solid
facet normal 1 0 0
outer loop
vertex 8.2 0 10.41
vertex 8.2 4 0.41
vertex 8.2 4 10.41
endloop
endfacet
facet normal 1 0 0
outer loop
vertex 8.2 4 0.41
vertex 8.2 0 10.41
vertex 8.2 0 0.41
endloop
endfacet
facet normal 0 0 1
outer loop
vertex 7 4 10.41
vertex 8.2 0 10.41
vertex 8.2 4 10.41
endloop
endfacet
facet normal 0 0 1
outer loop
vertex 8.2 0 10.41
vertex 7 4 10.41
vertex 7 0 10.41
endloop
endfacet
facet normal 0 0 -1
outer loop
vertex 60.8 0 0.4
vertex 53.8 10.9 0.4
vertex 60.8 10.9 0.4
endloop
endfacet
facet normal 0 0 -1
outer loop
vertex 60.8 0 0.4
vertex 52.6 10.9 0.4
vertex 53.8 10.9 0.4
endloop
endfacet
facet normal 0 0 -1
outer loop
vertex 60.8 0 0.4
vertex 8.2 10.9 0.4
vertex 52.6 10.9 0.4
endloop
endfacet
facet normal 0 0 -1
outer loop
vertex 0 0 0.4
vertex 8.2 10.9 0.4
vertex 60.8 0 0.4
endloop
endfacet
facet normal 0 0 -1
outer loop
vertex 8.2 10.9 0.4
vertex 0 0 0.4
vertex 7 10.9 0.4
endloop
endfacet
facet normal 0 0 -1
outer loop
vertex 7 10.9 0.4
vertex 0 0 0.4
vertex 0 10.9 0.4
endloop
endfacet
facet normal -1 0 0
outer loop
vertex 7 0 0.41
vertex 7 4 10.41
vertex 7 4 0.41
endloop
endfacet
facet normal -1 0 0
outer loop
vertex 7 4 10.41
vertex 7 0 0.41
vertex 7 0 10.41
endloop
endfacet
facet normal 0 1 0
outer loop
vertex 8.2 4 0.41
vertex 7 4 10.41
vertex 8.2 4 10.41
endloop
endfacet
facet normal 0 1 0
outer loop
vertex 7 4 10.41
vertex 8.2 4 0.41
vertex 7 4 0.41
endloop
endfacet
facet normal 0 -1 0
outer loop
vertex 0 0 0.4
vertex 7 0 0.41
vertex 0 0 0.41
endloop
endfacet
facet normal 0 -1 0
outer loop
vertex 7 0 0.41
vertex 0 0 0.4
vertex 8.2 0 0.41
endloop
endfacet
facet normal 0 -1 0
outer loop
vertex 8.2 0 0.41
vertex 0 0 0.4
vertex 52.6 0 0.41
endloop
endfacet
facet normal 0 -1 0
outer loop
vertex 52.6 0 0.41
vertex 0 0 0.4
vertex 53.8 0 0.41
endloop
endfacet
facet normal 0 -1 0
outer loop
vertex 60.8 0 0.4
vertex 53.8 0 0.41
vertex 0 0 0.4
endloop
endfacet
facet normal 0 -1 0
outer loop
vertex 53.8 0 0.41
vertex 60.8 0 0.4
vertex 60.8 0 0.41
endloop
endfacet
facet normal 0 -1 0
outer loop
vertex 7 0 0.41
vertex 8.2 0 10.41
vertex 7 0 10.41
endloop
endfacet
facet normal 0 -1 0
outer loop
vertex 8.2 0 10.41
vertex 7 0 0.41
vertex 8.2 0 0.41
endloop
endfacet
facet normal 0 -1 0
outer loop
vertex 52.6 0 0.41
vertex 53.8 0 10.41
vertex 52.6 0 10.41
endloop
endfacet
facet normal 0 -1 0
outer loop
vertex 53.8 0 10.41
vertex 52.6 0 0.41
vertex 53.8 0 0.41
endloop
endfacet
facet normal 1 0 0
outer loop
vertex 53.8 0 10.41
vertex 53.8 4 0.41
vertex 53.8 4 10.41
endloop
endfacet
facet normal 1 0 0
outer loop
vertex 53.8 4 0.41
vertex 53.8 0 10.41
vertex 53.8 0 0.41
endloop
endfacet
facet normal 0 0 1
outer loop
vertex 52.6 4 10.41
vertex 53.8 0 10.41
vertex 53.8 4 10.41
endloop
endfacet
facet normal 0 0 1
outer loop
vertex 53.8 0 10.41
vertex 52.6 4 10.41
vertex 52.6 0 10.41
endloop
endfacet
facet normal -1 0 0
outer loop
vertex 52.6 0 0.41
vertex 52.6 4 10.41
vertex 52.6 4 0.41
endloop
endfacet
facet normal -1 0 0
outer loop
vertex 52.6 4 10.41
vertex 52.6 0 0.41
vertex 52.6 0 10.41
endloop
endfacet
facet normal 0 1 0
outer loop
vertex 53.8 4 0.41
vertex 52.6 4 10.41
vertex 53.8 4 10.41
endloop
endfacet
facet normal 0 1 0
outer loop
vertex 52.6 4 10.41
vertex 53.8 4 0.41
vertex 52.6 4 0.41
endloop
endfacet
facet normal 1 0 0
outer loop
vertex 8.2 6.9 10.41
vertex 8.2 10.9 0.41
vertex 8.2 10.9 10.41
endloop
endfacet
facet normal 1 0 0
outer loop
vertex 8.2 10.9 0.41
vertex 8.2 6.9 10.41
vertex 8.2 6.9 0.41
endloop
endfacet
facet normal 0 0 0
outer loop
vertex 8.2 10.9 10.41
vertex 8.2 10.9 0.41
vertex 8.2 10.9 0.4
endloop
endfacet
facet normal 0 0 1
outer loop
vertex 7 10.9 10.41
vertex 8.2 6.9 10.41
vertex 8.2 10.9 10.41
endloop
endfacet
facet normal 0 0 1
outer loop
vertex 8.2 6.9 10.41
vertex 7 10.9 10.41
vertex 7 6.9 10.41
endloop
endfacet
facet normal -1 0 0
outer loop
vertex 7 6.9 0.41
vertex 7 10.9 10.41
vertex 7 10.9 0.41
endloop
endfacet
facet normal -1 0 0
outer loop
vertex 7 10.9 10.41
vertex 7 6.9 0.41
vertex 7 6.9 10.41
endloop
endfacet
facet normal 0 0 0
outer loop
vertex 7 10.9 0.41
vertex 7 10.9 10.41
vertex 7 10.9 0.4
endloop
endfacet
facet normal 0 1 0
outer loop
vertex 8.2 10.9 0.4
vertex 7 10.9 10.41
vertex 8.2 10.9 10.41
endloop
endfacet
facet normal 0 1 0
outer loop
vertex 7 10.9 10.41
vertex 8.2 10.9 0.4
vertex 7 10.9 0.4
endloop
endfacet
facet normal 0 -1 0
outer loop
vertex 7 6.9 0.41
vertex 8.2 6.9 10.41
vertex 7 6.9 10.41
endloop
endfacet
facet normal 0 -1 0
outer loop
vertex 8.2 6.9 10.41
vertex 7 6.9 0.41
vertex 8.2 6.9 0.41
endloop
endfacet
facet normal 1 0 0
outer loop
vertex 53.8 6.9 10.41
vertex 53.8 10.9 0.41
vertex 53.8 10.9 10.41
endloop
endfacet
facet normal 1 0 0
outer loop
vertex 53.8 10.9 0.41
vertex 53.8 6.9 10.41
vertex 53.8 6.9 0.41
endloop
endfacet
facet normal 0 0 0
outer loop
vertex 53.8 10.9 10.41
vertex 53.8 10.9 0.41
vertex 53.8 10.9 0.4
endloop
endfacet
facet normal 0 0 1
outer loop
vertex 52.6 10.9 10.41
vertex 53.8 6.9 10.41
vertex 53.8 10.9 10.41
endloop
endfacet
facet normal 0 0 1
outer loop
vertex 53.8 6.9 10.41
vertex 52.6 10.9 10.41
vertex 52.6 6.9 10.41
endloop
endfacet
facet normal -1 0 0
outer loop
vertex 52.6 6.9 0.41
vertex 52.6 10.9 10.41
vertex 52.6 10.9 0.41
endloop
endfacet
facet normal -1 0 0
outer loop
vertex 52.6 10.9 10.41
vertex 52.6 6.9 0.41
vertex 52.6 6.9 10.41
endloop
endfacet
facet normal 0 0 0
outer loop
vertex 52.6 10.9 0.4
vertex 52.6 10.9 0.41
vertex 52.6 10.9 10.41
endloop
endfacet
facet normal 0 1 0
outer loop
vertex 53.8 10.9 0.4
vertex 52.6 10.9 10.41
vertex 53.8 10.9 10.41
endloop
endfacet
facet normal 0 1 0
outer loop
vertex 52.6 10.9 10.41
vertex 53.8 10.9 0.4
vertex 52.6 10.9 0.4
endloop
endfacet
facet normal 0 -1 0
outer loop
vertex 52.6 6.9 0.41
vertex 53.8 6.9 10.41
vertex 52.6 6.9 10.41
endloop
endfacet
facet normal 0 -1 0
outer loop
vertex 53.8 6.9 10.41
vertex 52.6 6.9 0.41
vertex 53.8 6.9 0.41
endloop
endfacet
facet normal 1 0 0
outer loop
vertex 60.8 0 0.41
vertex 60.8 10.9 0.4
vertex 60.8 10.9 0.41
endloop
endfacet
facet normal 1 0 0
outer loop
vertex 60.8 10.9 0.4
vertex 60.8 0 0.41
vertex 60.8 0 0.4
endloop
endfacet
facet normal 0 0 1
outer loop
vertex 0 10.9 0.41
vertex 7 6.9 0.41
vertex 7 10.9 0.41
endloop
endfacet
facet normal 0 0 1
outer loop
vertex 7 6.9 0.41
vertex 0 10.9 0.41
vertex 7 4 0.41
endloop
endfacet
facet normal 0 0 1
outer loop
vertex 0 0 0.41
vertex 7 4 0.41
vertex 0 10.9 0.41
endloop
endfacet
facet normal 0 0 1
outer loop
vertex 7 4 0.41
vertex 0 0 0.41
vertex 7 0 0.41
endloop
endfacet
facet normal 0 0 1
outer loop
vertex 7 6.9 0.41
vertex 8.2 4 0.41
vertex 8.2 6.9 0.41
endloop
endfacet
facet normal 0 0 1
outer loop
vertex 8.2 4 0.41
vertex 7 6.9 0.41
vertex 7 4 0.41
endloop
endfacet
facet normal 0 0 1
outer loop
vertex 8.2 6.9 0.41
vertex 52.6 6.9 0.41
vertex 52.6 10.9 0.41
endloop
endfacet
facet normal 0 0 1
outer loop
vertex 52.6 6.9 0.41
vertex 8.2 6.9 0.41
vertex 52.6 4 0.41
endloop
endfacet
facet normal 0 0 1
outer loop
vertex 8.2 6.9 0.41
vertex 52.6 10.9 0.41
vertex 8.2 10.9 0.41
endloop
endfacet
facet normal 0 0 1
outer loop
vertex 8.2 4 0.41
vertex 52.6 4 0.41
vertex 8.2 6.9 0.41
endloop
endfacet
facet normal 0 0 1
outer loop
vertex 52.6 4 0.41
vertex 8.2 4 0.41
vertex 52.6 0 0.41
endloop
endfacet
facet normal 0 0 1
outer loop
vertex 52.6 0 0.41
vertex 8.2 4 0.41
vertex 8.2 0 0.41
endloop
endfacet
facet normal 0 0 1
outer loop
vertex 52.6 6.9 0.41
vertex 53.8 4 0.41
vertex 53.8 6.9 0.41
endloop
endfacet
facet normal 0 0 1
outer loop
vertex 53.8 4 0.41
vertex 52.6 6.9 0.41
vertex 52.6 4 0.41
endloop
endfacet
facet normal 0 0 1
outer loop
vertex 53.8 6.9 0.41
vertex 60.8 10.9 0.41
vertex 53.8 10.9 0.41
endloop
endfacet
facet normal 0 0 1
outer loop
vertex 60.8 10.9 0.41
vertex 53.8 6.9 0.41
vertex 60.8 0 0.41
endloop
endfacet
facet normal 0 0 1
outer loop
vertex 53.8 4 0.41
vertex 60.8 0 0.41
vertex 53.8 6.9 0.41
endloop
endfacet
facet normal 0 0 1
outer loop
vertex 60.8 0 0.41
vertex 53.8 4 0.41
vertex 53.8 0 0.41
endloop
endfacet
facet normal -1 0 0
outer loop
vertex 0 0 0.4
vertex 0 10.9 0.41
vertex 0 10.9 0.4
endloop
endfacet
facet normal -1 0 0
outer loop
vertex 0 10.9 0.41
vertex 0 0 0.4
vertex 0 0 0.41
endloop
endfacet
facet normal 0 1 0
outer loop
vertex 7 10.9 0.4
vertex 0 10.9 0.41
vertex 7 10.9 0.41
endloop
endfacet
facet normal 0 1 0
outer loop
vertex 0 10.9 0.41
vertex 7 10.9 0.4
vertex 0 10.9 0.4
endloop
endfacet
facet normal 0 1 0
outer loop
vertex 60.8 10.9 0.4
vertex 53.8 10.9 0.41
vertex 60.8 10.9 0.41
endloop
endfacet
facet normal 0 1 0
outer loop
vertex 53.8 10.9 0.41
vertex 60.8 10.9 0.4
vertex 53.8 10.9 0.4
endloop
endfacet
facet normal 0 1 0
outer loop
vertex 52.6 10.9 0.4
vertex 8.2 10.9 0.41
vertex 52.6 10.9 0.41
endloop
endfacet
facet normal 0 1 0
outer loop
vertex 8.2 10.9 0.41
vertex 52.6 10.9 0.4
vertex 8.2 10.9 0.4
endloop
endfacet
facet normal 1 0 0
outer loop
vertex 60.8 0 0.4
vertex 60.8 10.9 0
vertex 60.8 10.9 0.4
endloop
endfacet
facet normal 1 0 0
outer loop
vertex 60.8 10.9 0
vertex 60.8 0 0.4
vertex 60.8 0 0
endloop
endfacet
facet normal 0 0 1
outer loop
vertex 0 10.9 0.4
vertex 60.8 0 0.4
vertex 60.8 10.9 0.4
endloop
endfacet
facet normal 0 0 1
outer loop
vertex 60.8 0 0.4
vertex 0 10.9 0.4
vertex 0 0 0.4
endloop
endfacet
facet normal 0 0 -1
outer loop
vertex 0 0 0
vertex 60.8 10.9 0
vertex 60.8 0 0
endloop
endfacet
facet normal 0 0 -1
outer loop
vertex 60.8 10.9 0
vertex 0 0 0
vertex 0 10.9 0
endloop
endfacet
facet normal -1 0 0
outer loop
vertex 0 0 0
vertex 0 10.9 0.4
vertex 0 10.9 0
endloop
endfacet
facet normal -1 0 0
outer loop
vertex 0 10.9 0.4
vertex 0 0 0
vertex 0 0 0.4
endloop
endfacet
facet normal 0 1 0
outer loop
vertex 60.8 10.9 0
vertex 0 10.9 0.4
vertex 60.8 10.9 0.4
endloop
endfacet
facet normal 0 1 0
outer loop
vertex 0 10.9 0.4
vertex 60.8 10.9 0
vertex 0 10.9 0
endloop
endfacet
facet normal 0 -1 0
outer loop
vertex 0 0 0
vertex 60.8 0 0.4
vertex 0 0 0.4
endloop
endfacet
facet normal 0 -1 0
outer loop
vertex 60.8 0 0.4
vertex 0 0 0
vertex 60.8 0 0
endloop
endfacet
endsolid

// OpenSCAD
// file: ../../Base/Rotation.scad
// Fischertechnik Box Foundation
// Geometry Helpers Rotation

include <PlacementOptions.scad>

// getRotatedSpace(space, rotation=NoRotation)
// Rotates the space dependent on the specified rotation

function getRotatedSpace(space, rotation=NoRotation) = [
    (rotation == Rotate90 || rotation == Rotate270) ? space.y : space.x,
    (rotation == Rotate90 || rotation == Rotate270) ? space.x : space.y
];

// Rotates the given space around the fixed left lower corner
// space = the space the children needs as width/depth list [width,depth]
// rotation = 0 Rotate0 degrees, 1 Rotate90 degrees, 2 Rotate180 degrees, 3 Rotate270 degrees (equivalent to -90)

module RotateFix(space, rotation=NoRotation) {
    dy = (rotation == Rotate0 || rotation == Rotate270) ? 0 :
        (rotation == Rotate90) ? space.x :
        space.y;
    dx = (rotation < Rotate180) ? 0 :
        (rotation == Rotate180) ? space.x :
        space.y;
    
    translate([dx, dy, 0])
        rotate([0, 0, rotations[rotation]])
            children();
}
// file: ../../Base/Alignment.scad
// Fischertechnik Box Foundation
// Geometry Helpers Alignment

include <PlacementOptions.scad>

// getAlignedX(elementWidth, spaceWidth, align=AlignRight, offset=0)
// Gets the aligned X offset of an element with the given
// width in the given space.
// elementWidth = The width of the element to positon
// spaceWidth = The space where the element should be aligned
// align = 0 AlignLeft, 1 AlignCenter, 2 AlignRight
// offset = an optional offset from the aligned position. When
// aligned left or centered, then positive values are in X direction.
// When aligned right then positive values are in negative X direction.

function getAlignedX(elementWidth, spaceWidth, align=AlignRight, offset=0) =
    (align == AlignLeft) ?
        offset :
        ((align == AlignCenter) ?
        (spaceWidth - elementWidth)/2 + offset :
        spaceWidth - offset - elementWidth);

// getAlignedY(elementDepth, spaceDepth, align=AlignTop, offset=0)
// Gets the aligned Y offset of an element with the given
// depth in the given space.
// elementDepth = The depth of the element to positon
// spaceDepth = The space where the element should be aligned
// align = 0 AlignBottom, 1 AlignCenter, 2 AlignTop
// offset = an optional offset from the aligned position. When
// aligned bottom or centered, then positive values are in Y direction.
// When aligned top then positive values are in negative Y direction.

function getAlignedY(elementDepth, spaceDepth, align=AlignTop, offset=0) =
    (align == AlignBottom) ?
        offset :
        ((align == AlignCenter) ?
        (spaceDepth - elementDepth)/2 + offset :
        spaceDepth - offset - elementDepth);
// file: ../../Base/Boxes.scad
// Fischertechnik Box Foundation
// Pre-designed Boxes

use <Constants.scad>

include <PlacementOptions.scad>

box190Width = 190;
box190Depth = 130;
box130Width = 130;
box130Depth = 95;

// Values are from an original ec3 box
topBottomDifference = 1.5;
outerHeight = 40;
baseThickness = 1.8;
innerHeight = outerHeight - baseThickness;
stackExcess = 5.7;
radius = 3.5;
wallThickness = 1.5;
tolerance = 0.2;

boxWallThickness = wallThickness;
boxBaseThickness = baseThickness;
boxWebWidth = 3.0;

// getBoxWallThickness()
// Gets the wall thickness of a Fischertechnik Box
function getBoxWallThickness() = boxWallThickness;

// getBoxUsageHeight(height = 38.2)
// Gets the usable height of a Fischertechnik box
// height = Outer height of the box from the bottom to the upper edge.
function getBoxUsageHeight(height = outerHeight) = height - baseThickness - stackExcess;

// getBoxInnerHeight()
// Gets the inner height of a Fischertechnik box, including the stack excess
function getBoxInnerHeight() = innerHeight;

// getBoxBaseThickness()
// Gets the thickness of the Fischertechnik box base.
function getBoxBaseThickness() = boxBaseThickness;

// getBoxWebWidth()
// Gets the width of a box web
function getBoxWebWidth() = boxWebWidth;

// getBox190Space()
// Gets the usable inner space of a Box 190 as an x/y-list
function getBox190Space() = [
    box190Width - 2*getBoxWallThickness() - topBottomDifference, 
    box190Depth - 2*getBoxWallThickness() - topBottomDifference ];

// RoundedCornerPlate(width, depth, height, radius)
// Creates a body plate with rounded corners for a box. Used
// also to create the complete box with the hull module.
// width = Width of the plate
// depth = depth of the plate 
// height = thickness of the plate
// radius = radius of the rounded corner
module RoundedCornerPlate(width, depth, height, radius) {
    translate([radius, radius])
    hull() {
        w = width-2*radius;
        d = depth-2*radius;
        cube([w, d, height]);
        cylinder(height, r=radius, $fn=getFragments());
        translate([w, 0])
            cylinder(height, r=radius, $fn=getFragments());
        translate([w, d])
            cylinder(height, r=radius, $fn=getFragments());
        translate([0, d])
            cylinder(height, r=radius, $fn=getFragments());
    }
}

// BoxBase(width, depth)
// Creates an empty stackable Fischertechnik compatible box
// width = Outer width of the box (190, 130, ...)
// depth = Outer depth of the box (130, 95, ...)

module BoxBase(width, depth, height=outerHeight) {    
    thinPlate = 0.01;

    innerHeight = height - baseThickness;    
    
    module Body(tolerance=tolerance) {
        hull() {
            // Bottom with tolerance to fit into the original boxes when stacked
            translate([-wallThickness+tolerance, -wallThickness+tolerance, -baseThickness])
                RoundedCornerPlate(width-topBottomDifference-2*tolerance, depth-topBottomDifference-2*tolerance, thinPlate, radius);
            
            // Top
            translate([-wallThickness-topBottomDifference/2, -wallThickness-topBottomDifference/2, innerHeight-thinPlate])
                RoundedCornerPlate(width, depth, thinPlate, radius);
         }
    }

    module Cutoff() {
        hull() {
            coWidth = width - 2*wallThickness;
            coDepth = depth - 2*wallThickness;
            
            // Bottom
            RoundedCornerPlate(coWidth-topBottomDifference, coDepth-topBottomDifference, thinPlate, radius);

            // Top
            translate([-topBottomDifference/2, -topBottomDifference/2, innerHeight+thinPlate]) 
                RoundedCornerPlate(coWidth, coDepth, thinPlate, radius);
        }
    }
    
    difference() {        
        Body();
        Cutoff();
        stackOffset = innerHeight - stackExcess;
        translate([0, 0, stackOffset + baseThickness])
            Body(tolerance=0);
    }
}

// Creates the Fischertechnik empty box 130x190 mm and places it at position 0,0
// 190x130 are the outer sizes, the inner space is slightly smaller. Use getBox190Space() to get the inner sizes.
// The box is positioned that the usable inner space is at the 0,0,0 position.

module Box190() {
    BoxBase(box190Width, box190Depth);
}

// Gets the usable inner space of a Box 130 as an x/y-list
function getBox130Space() = [
    box130Width - 2*getBoxWallThickness() - topBottomDifference, 
    box130Depth - 2*getBoxWallThickness() - topBottomDifference ];

// Creates the Fischertechnik empty box 95x130 mm and places it at position 0,0
// 190x130 are the outer sizes, the inner space is slightly smaller. Use getBox190Space() to get the inner sizes.
// The box is positioned that the usable inner space is at the 0,0,0 position.

module Box130() {
    BoxBase(box130Width, box130Depth);
}

// Creates a web at the specified box walls
// corner 0 = LowerLeft, 1 = UpperLeft, 2 = UpperRight, 3 = LowerRight
// side 0 = LeftOfCorner, 1 = RightOfCorner
// distance = Distance in mm from the corner
// boxSpace = inner width and depth of the box (default: Box 190)
// webWidth = length of the web (default is 3 mms)
// webThickness = thickness of the web (default is 1 mm)
// height = Height of the web (standard is getBoxUsageHeight())
// sink = How much of the web is sunk into the wall

module BoxWeb(
    corner, 
    side, 
    distance, 
    boxSpace=getBox190Space(), 
    webWidth=getBoxWebWidth(), 
    webThickness=1.0, 
    height=getBoxUsageHeight(),
    sink = getBoxWallThickness()/2) {
    width = (corner % 2 == 0) ? 
            (side == LeftOfCorner ? webWidth : webThickness) :
            (side == LeftOfCorner ? webThickness : webWidth);

    depth = (corner % 2 == 0) ? 
            (side == RightOfCorner ? webWidth : webThickness) :
            (side == RightOfCorner ? webThickness : webWidth);
    
    xDiff = corner == LowerLeft ? 
                (side == LeftOfCorner ? -sink : distance) :
            (corner == UpperLeft ?                
                (side == LeftOfCorner ? distance : -sink) :
            (corner == UpperRight ?
                (side == LeftOfCorner ? boxSpace.x-webWidth+sink : boxSpace.x-distance-webThickness) :
                (side == LeftOfCorner ? boxSpace.x-distance-webThickness: boxSpace.x-webWidth+sink)));

    yDiff = corner == LowerLeft ? 
                (side == RightOfCorner ? -sink : distance) :
            (corner == UpperLeft ?
                (side == RightOfCorner ? boxSpace.y-distance-webThickness : boxSpace.y-webWidth+sink) :
            (corner == UpperRight ?
                (side == RightOfCorner ? boxSpace.y-webWidth+sink : boxSpace.y-distance-webThickness) :
                (side == RightOfCorner ? distance : -sink)));
    
    translate([xDiff, yDiff, -getExcess()])
        cube([width, depth, height + 2*getExcess()]);
}
// file: ../../Base/PlacementOptions.scad
// Fischertechnik Box Foundation
// Placement Options

// Alignment
NoAlign = 0;
AlignLeft = 1;
AlignBottom = 2;
AlignCenter = 3;
AlignRight = 4;
AlignTop = 5;

// Element rotation degree steps
rotations = [0, -90, -180, -270];

// Rotation
NoRotation = 0;
Rotate0 = 0;
Rotate90 = 1;
Rotate180 = 2;
Rotate270 = 3;

// Docking (seen from above)
NoDock = -1;
DockLeft = 0;
DockTop = 1;
DockRight = 2;
DockCorner = 2;
DockBottom = 3;

// Web corners
LowerLeft = 0;
UpperLeft = 1;
UpperRight = 2;
LowerRight = 3;

// Web position relative to corner
LeftOfCorner = 0;
RightOfCorner = 1;

// Rails direction
Horizontal = true;
Vertical = false;
// file: ../../Base/Placement.scad
// Fischertechnik Box Foundation
// Geometry Helpers Placement

use <Constants.scad>
use <Alignment.scad>
use <Rotation.scad>
use <Boxes.scad>

include <PlacementOptions.scad>

// Place(x=0, y=0, elementSpace=[0,0], alignX=AlignLeft, alignY=AlignBottom, rotation=Rotate0, boxSpace=getBox190Space())
// Places the child at the specified position
// y = Y-Position. This is a relative position when an X aligment is specified.
// x = X-Position. This is a relative position when an Y aligment is specified.
// elementSpace = space of the element to be placed [x,y]
// alignX = -1=NoAlign, 0 AlignLeft, 1 AlignCenter, 3 AlignRight (elementSpace and boxSpace required!)
// alignY = -1=NoAlign, 2 AlignBottom, 1 AlignCenter, 4 AlignTop (elementSpace and boxSpace required!)
// rotation = 0 Rotate0 0 degrees, 1 Rotate90 90 degrees, 
// 2 Rotate180 180 degrees, 3 Rotate270 270 degrees (equivalent to -90)
// boxSpace = Inner space of the box where the placement occurs [x,y] - default is Box 190x130 inner space

module Place(x=0, y=0, elementSpace=[0,0], 
  alignX=AlignLeft, alignY=AlignBottom, 
  rotation=NoRotation, boxSpace=getBox190Space()) {

    module Position(x, y, space, rotation=Rotate0) {
        translate([x, y, 0])
            RotateFix(space, rotation)
                children();
    }

    space = getRotatedSpace(elementSpace, rotation);
    alignedX = getAlignedX(space.x, boxSpace.x, alignX, x);
    alignedY = getAlignedY(space.y, boxSpace.y, alignY, y);
    Position(alignedX, alignedY, elementSpace, rotation)
        children();
}

// Center(space=getBox130Space(), elementSpace=[0,0])
// space = Space where the children is centered. For cylinder use centered=true and no elementSpace.
// elementSpace = space of the element to be centered [x,y]

module Center(space=getBox190Space(), elementSpace=[0,0]) {
    Place(elementSpace=elementSpace, boxSpace=space, alignX=AlignCenter, alignY=AlignCenter)
        children();
}

// CenterHorizontal(width=0, y=0, offset=0, space=getBox130Space())
// width = Width of the element to be placed.
// y = Y position of the element
// offset = Offset from the center position (negative will be left of the center)
// space = Space where the element is placed

module CenterHorizontal(width=0, y=0, offset=0, space=getBox190Space()) {
    Place(x=offset, y=y, elementSpace=[width, 0], boxSpace=space, alignX=AlignCenter)
        children(0);
}

// CenterVertical(depth=0, x=0, offset=0, space=getBox130Space())
// depth = Depth of the element to be placed.
// x = X position of the element
// offset = Offset from the center position (negative will be down of the center)
// space = Space where the element is placed

module CenterVertical(depth=0, x=0, offset=0, space=getBox190Space()) {
    Place(x=x, y=offset, elementSpace=[0, depth], boxSpace=space, alignY=AlignCenter)
        children(0);
}

// getIsVertical(align)
// True if the specified alignment needs a vertical orientation for a divider (AlignRight, AlignLeft)

function getIsVertical(align) = (align == AlignRight || align == AlignLeft);

// getIsHorizontal(align)
// True if the specified alignment needs a horizontal orientation for a divider (AlignTop, AlignBottom)

function getIsHorizontal(align) = (align == AlignTop || align == AlignBottom);
// file: ../../Elements/AxisClip10.scad
// Fischertechnik Box Library
// Axis for clip 10
// 31023

use <../ModelBase/Simple.scad>
use <../Base/Constants.scad>

/* [Element Parameters] */
height = 23;
clipHeight = 10;

/* [Hidden] */
width = 12;
depth = 12;
upperDiameter = 3.6;

// getAxisClip10Space()
// Gets the space of a n axis for a clip 10 with spring ring (mot2)

function getAxisClip10Space() = [width, depth, height];

// AxisClip10(height, clipHeight)
// Axis for clip 10 with spring ring (mot2)
// height = Height of the complete axis (standard is 23, in mot3 its only 12)
// clipHeight = Height of the part for the clip (standard is 10, in mot3 its only 7)

module AxisClip10(height=height, clipHeight=clipHeight) {
    LeveledAxisWithSpace(height, height-clipHeight, getAxisClip10Space(), diameter=upperDiameter);
}

// Test
color("lightgray")
AxisClip10(height, clipHeight);
// file: ../../Base/Constants.scad
// Fischertechnik Box Foundation
// Constants

// Constant values necessary for multiple elements

// Base constants
dividerThickness = 1.2;
excess = 0.01;
fragments = 90;
tolerance = 0.8;

// Gets the thickness of a divider 
function getDividerThickness() = dividerThickness;

// Gets the excess that is used to merge walls into each other
function getExcess() = excess;

// Gets amount of fragments of a cylinder
function getFragments() = fragments;

// Gets the inner tolerance of a frame to each side
function getTolerance() = tolerance;


// Fischertechnik specific constants
axisDiameter = 4;
axisBottomDiameter = axisDiameter + 1;
axisTolerance = 0.2;
axisLockingLength = 8;

// Gets axis diameter of Fischertechnik axis
function getAxisDiameter() = axisDiameter;

// Gets axis diameter tolerance (subtracted for element axis)
function getAxisTolerance() = axisTolerance;

// Gets the axis diameter for standing axis
function getStandAxisDiameter() = getAxisDiameter() - getAxisTolerance();

// Gets axis bottom diameter for thicker part at the bottom
function getAxisBottomDiameter() = axisBottomDiameter;

// Gets the lengthh of the locking part of a locking axis
function getAxisLockingLength() = axisLockingLength;

pinHeight = 2.5;
pinTolerance = 0.2;

// gets the height of a connecting pin
function getPinHeight() = pinHeight;

// gets the connecting pin height tolerance
function getPinTolerance() = pinTolerance;

standardEdgeDistance = 2.5;
standardWebDistance = 11.5;
standardCornerLength = 15;

// gets the standard distance to the wall of the box for dockable frames with webs
function getStandardEdgeDistance() = standardEdgeDistance;

// gets the standard distance of each web to the corner of the dockable frame
function getStandardWebDistance() = standardWebDistance;

// gets the standard length of the corner walls of a dockable frame
function getStandardCornerLength() = standardCornerLength;

tubeWallFactor = 0.8;

// gets the wall thickness of a tube.
function getTubeWallThickness() = tubeWallFactor * getDividerThickness();

smallPartsFrameHeight = 20;

// gets the frame height for docked small parts boxes.
function getSmallPartsFrameHeight() = smallPartsFrameHeight;

hubRingDiameter = 19.5;
hubRingLevelDiameter = 21;

// gets the diameter of a tube matching the inner ring of a wheel
function getHubRingDiameter() = hubRingDiameter;

// gets the diameter of a hub tube with a thicker diameter
function getHubRingLevelDiameter() = hubRingLevelDiameter;
// file: ../../Elements/HolderBuildingPlate15x60.scad
// Fischertechnik Box Library
// Holder for Building Plate 30x45
// 38464

use <../ModelBase/Complex.scad>

/* [Element Parameters] */
count = 1;
dock = false;

/* [Hidden] */
width = 60;

// getHolderBuildingPlate15x60Space(count = 1)
// Gets the width (.x) and depth (.y) space the holder needs.

function getHolderBuildingPlate15x60Space(count = 1) = getHolderBuildingPlateSpace(width, count);

// HolderBuildingPlate15x60(count=1, dock=false)
// Holder for building plates 15x60
// count = Count of building plates (default 1)
// dock = true if the holders are docked to the box wall (default false) 

module HolderBuildingPlate15x60(count = 1, dock = false) {
    HolderBuildingPlate(width, count, dock);
}

// Test
color("lightgray")
HolderBuildingPlate15x60(count, dock);
// file: ../TestPrint.scad
// 3D Print Test Base

use <../Base/Constants.scad>

use <../Elements/AxisClip10.scad>

module TestPrint(elementSpace) {
    cube([elementSpace.x, elementSpace.y, 0.4]);
    translate([0,0,0.4+getExcess()]) {
        children();
    }
}

TestPrint(getAxisClip10Space())
    AxisClip10();
// main file
// 3D Print Test
// HolderBuildingPlate15x60

use <../TestPrint.scad>
use <../../Elements/HolderBuildingPlate15x60.scad>

count=1;
dock=false;

TestPrint(getHolderBuildingPlate15x60Space(count))
    HolderBuildingPlate15x60(count, dock);
